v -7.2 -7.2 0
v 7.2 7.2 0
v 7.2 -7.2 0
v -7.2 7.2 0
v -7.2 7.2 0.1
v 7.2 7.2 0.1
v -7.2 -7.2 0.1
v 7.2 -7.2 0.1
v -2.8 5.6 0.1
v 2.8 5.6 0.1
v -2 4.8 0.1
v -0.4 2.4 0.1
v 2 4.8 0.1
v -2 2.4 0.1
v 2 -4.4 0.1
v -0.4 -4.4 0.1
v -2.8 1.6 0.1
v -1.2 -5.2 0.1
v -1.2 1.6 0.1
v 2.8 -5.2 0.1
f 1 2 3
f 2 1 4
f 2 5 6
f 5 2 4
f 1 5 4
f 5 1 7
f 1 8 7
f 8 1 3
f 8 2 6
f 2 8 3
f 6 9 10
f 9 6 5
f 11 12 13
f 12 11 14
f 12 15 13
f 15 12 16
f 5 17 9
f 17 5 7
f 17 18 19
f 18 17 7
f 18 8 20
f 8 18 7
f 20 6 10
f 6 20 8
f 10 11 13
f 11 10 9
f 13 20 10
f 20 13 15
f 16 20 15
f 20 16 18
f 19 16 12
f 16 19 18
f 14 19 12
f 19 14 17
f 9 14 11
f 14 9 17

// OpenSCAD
// file: ../p/box5-12.scad
use <../lib.scad>
function ldraw_lib__box5_12() = [
// 0 Box with 5 Faces without Any Edges
// 0 Name: box5-12.dat
// 0 Author: Chris Dee [cwdee]
// 0 !LDRAW_ORG Primitive UPDATE 2009-02
// 0 !LICENSE Licensed under CC BY 2.0 and CC BY 4.0 : see CAreadme.txt
// 
// 0 BFC CERTIFY CCW
  [0,"BFC","CERTIFY"],
  [0,"BFC","CCW"],
// 
// 0 !HISTORY 2009-09-03 [PTadmin] Official Update 2009-02
// 
// 
// 4 16 1 1 1 1 1 -1 -1 1 -1 -1 1 1
  [4,16,1,1,1,1,1,-1,-1,1,-1,-1,1,1],
// 4 16 -1 0 1 1 0 1 1 1 1 -1 1 1
  [4,16,-1,0,1,1,0,1,1,1,1,-1,1,1],
// 4 16 -1 0 -1 -1 0 1 -1 1 1 -1 1 -1
  [4,16,-1,0,-1,-1,0,1,-1,1,1,-1,1,-1],
// 4 16 1 0 -1 -1 0 -1 -1 1 -1 1 1 -1
  [4,16,1,0,-1,-1,0,-1,-1,1,-1,1,1,-1],
// 4 16 1 0 1 1 0 -1 1 1 -1 1 1 1
  [4,16,1,0,1,1,0,-1,1,1,-1,1,1,1],
// 0
];
module ldraw_lib__box5_12(step=0, col=false, unit=2/5, alt=false, line=0.2, solid=!$preview)
    makepoly(ldraw_lib__box5_12(), step=step, col=col, unit=unit, alt=alt, line=line, solid=solid);
ldraw_lib__box5_12(line=0.2);
// main file
use <../lib.scad>
use <../p/box5-12.scad>
function ldraw_lib__192895e() = [
// 0 Sticker  1.9 x  1.9 with Number 1 Red with White Outline on Red
// 0 Name: 192895e.dat
// 0 Author: Bjoern Sigve Storesund [Storesund]
// 0 !LDRAW_ORG Part UPDATE 2017-01
// 0 !LICENSE Licensed under CC BY 2.0 and CC BY 4.0 : see CAreadme.txt
// 
// 0 BFC CERTIFY CCW
  [0,"BFC","CERTIFY"],
  [0,"BFC","CCW"],
// 
// 0 !KEYWORDS Fire, Set 6382
// 
// 0 !HISTORY 2017-12-30 [PTadmin] Official Update 2017-01
// 
// 
// 1 16 0 -0.25 0 18 0 0 0 0.25 0 0 0 18 box5-12.dat
  [1,16,0,-0.25,0,18,0,0,0,0.25,0,0,0,18, ldraw_lib__box5_12()],
// 4 4 -18 -.25 18 -7 -.25 14 7 -.25 14 18 -.25 18
  [4,4,-18,-.25,18,-7,-.25,14,7,-.25,14,18,-.25,18],
// 4 4 -5 -.25 12 -5 -.25 6 -1 -.25 6 5 -.25 12
  [4,4,-5,-.25,12,-5,-.25,6,-1,-.25,6,5,-.25,12],
// 4 4 5 -.25 -11 5 -.25 12 -1 -.25 6 -1 -.25 -11
  [4,4,5,-.25,-11,5,-.25,12,-1,-.25,6,-1,-.25,-11],
// 4 4 -18 -.25 18 -18 -.25 -18 -7 -.25 4 -7 -.25 14
  [4,4,-18,-.25,18,-18,-.25,-18,-7,-.25,4,-7,-.25,14],
// 4 4 -7 -.25 4 -18 -.25 -18 -3 -.25 -13 -3 -.25 4
  [4,4,-7,-.25,4,-18,-.25,-18,-3,-.25,-13,-3,-.25,4],
// 4 4 -3 -.25 -13 -18 -.25 -18 18 -.25 -18 7 -.25 -13
  [4,4,-3,-.25,-13,-18,-.25,-18,18,-.25,-18,7,-.25,-13],
// 4 4 7 -.25 14 7 -.25 -13 18 -.25 -18 18 -.25 18
  [4,4,7,-.25,14,7,-.25,-13,18,-.25,-18,18,-.25,18],
// 4 15 -7 -.25 14 -5 -.25 12 5 -.25 12 7 -.25 14
  [4,15,-7,-.25,14,-5,-.25,12,5,-.25,12,7,-.25,14],
// 4 15 7 -.25 -13 7 -.25 14 5 -.25 12 5 -.25 -11
  [4,15,7,-.25,-13,7,-.25,14,5,-.25,12,5,-.25,-11],
// 4 15 -3 -.25 -13 7 -.25 -13 5 -.25 -11 -1 -.25 -11
  [4,15,-3,-.25,-13,7,-.25,-13,5,-.25,-11,-1,-.25,-11],
// 4 15 -3 -.25 4 -3 -.25 -13 -1 -.25 -11 -1 -.25 6
  [4,15,-3,-.25,4,-3,-.25,-13,-1,-.25,-11,-1,-.25,6],
// 4 15 -3 -.25 4 -1 -.25 6 -5 -.25 6 -7 -.25 4
  [4,15,-3,-.25,4,-1,-.25,6,-5,-.25,6,-7,-.25,4],
// 4 15 -7 -.25 14 -7 -.25 4 -5 -.25 6 -5 -.25 12
  [4,15,-7,-.25,14,-7,-.25,4,-5,-.25,6,-5,-.25,12],
];
module ldraw_lib__192895e(step=0, col=false, unit=2/5, alt=false, line=0.2, solid=!$preview)
    makepoly(ldraw_lib__192895e(), step=step, col=col, unit=unit, alt=alt, line=line, solid=solid);
ldraw_lib__192895e(line=0.2);
